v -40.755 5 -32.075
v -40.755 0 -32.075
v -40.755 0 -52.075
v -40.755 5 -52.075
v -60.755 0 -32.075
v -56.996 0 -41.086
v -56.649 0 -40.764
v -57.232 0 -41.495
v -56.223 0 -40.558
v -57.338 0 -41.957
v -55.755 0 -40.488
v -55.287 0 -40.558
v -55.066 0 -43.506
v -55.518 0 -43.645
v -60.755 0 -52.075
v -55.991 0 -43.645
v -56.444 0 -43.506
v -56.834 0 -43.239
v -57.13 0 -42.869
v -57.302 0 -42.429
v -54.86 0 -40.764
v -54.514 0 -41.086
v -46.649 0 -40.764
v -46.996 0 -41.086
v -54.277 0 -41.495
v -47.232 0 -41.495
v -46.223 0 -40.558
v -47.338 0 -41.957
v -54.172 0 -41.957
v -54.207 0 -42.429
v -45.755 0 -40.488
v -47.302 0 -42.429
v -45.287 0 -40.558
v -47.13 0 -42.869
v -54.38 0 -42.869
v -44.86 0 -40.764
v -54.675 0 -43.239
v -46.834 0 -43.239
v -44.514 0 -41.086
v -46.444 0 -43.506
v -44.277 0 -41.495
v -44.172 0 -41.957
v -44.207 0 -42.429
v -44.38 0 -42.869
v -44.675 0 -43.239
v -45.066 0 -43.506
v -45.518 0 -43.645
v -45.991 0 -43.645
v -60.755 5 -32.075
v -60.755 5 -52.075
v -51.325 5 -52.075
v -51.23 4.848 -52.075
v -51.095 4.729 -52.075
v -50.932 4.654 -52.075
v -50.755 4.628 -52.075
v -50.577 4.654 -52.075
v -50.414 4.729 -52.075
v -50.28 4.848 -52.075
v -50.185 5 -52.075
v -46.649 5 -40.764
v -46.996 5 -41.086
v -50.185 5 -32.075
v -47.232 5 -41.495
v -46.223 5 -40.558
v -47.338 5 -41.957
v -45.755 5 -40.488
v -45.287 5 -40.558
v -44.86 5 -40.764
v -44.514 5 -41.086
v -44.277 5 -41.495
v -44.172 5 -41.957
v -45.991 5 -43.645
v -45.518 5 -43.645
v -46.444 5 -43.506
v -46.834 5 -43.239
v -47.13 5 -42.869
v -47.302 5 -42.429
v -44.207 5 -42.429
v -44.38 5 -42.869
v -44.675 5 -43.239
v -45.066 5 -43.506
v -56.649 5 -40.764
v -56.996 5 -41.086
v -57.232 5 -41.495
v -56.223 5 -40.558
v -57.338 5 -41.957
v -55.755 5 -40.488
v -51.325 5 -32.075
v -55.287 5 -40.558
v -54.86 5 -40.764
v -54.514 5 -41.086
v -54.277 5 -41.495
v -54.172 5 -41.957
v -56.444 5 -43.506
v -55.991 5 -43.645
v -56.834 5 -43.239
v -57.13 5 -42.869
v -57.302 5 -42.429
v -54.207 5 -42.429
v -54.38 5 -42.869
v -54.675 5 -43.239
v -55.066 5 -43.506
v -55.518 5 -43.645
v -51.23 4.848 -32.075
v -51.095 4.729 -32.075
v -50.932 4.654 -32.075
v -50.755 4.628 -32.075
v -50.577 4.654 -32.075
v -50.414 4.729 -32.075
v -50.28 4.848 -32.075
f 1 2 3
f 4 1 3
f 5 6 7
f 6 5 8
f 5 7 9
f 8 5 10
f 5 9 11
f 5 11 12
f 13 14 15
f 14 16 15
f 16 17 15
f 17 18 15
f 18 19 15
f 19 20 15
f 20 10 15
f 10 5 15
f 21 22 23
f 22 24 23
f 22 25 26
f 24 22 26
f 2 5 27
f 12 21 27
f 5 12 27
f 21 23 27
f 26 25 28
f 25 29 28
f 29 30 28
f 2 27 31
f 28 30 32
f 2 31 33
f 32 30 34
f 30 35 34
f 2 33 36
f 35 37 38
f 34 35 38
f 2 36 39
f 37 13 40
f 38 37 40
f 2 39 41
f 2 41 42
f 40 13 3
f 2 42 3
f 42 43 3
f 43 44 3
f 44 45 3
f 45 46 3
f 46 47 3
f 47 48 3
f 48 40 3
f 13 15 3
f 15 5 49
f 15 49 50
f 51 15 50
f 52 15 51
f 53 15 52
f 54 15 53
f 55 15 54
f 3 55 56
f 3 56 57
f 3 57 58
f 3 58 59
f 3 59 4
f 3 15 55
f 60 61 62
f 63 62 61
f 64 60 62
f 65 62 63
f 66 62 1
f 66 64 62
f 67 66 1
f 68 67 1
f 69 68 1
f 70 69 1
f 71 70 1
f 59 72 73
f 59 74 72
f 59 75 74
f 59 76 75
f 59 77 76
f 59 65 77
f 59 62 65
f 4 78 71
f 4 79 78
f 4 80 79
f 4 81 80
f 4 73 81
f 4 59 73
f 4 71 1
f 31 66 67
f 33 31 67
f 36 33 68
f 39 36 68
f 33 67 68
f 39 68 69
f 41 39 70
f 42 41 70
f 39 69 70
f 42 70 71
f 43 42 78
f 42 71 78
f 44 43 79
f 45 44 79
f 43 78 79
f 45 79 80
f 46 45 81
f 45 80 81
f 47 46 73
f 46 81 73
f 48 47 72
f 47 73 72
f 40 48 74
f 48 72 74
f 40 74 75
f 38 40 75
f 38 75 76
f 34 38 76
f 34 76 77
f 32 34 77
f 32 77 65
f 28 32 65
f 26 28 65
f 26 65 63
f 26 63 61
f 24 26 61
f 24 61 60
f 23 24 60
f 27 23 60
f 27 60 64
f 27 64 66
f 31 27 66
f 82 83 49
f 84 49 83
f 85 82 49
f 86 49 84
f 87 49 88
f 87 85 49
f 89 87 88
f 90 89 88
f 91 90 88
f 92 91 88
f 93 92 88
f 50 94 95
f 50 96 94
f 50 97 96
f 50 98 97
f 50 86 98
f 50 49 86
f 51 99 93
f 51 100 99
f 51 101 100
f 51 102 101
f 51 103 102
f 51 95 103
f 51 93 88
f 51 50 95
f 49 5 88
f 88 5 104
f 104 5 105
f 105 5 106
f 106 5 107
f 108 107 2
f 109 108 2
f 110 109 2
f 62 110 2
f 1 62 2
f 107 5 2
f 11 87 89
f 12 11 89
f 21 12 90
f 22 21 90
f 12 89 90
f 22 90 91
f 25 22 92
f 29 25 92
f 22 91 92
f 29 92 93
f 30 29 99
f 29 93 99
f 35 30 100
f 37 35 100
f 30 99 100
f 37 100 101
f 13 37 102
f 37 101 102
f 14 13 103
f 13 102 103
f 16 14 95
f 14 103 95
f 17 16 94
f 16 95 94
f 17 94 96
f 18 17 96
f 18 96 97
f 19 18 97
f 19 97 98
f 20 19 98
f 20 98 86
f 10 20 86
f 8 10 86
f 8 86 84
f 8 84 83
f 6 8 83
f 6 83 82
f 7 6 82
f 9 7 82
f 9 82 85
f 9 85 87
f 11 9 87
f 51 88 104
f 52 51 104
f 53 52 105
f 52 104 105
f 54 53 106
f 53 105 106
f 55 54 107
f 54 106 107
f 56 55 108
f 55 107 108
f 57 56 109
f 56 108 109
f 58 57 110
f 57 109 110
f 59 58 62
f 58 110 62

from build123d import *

# Parameters (mm, degrees)
SKETCH1_W           = 20
SKETCH1_H           = 20
BOSS_EXTRUDE1_DEPTH = 5
SKETCH2_R           = 0.6223
CUT_EXTRUDE1_DEPTH  = 65.157116795
SKETCH3_R           = 1.5875
CUT_EXTRUDE2_DEPTH  = 81.174749068


with BuildPart() as part:
    # Sketch1 → Boss-Extrude1 (new body)
    with BuildSketch(Plane(origin=(0, 0, 0), x_dir=(1, 0, 0), z_dir=(0, 1, 0))):
        with Locations((-50.754716981, 42.075471698)):
            Rectangle(SKETCH1_W, SKETCH1_H)
    extrude(amount=BOSS_EXTRUDE1_DEPTH)

    # Sketch2 → Cut-Extrude1 (cut, through all)
    with BuildSketch(Plane.XY.offset(-32.075471698)):
        with Locations((-50.754716981, 5.25)):
            Circle(SKETCH2_R)
    extrude(amount=-CUT_EXTRUDE1_DEPTH, mode=Mode.SUBTRACT)

    # Sketch3 → Cut-Extrude2 (cut, through all)
    with BuildSketch(Plane(origin=(0, 5, 0), x_dir=(1, 0, 0), z_dir=(0, 1, 0))):
        with Locations(Location((-55.754716981, 42.075471698, 0), (0, 0, 270))):
            Circle(SKETCH3_R)
        with Locations(Location((-45.754716981, 42.075471698, 0), (0, 0, 270))):
            Circle(SKETCH3_R)
    extrude(amount=-CUT_EXTRUDE2_DEPTH, mode=Mode.SUBTRACT)


solid = part.part
